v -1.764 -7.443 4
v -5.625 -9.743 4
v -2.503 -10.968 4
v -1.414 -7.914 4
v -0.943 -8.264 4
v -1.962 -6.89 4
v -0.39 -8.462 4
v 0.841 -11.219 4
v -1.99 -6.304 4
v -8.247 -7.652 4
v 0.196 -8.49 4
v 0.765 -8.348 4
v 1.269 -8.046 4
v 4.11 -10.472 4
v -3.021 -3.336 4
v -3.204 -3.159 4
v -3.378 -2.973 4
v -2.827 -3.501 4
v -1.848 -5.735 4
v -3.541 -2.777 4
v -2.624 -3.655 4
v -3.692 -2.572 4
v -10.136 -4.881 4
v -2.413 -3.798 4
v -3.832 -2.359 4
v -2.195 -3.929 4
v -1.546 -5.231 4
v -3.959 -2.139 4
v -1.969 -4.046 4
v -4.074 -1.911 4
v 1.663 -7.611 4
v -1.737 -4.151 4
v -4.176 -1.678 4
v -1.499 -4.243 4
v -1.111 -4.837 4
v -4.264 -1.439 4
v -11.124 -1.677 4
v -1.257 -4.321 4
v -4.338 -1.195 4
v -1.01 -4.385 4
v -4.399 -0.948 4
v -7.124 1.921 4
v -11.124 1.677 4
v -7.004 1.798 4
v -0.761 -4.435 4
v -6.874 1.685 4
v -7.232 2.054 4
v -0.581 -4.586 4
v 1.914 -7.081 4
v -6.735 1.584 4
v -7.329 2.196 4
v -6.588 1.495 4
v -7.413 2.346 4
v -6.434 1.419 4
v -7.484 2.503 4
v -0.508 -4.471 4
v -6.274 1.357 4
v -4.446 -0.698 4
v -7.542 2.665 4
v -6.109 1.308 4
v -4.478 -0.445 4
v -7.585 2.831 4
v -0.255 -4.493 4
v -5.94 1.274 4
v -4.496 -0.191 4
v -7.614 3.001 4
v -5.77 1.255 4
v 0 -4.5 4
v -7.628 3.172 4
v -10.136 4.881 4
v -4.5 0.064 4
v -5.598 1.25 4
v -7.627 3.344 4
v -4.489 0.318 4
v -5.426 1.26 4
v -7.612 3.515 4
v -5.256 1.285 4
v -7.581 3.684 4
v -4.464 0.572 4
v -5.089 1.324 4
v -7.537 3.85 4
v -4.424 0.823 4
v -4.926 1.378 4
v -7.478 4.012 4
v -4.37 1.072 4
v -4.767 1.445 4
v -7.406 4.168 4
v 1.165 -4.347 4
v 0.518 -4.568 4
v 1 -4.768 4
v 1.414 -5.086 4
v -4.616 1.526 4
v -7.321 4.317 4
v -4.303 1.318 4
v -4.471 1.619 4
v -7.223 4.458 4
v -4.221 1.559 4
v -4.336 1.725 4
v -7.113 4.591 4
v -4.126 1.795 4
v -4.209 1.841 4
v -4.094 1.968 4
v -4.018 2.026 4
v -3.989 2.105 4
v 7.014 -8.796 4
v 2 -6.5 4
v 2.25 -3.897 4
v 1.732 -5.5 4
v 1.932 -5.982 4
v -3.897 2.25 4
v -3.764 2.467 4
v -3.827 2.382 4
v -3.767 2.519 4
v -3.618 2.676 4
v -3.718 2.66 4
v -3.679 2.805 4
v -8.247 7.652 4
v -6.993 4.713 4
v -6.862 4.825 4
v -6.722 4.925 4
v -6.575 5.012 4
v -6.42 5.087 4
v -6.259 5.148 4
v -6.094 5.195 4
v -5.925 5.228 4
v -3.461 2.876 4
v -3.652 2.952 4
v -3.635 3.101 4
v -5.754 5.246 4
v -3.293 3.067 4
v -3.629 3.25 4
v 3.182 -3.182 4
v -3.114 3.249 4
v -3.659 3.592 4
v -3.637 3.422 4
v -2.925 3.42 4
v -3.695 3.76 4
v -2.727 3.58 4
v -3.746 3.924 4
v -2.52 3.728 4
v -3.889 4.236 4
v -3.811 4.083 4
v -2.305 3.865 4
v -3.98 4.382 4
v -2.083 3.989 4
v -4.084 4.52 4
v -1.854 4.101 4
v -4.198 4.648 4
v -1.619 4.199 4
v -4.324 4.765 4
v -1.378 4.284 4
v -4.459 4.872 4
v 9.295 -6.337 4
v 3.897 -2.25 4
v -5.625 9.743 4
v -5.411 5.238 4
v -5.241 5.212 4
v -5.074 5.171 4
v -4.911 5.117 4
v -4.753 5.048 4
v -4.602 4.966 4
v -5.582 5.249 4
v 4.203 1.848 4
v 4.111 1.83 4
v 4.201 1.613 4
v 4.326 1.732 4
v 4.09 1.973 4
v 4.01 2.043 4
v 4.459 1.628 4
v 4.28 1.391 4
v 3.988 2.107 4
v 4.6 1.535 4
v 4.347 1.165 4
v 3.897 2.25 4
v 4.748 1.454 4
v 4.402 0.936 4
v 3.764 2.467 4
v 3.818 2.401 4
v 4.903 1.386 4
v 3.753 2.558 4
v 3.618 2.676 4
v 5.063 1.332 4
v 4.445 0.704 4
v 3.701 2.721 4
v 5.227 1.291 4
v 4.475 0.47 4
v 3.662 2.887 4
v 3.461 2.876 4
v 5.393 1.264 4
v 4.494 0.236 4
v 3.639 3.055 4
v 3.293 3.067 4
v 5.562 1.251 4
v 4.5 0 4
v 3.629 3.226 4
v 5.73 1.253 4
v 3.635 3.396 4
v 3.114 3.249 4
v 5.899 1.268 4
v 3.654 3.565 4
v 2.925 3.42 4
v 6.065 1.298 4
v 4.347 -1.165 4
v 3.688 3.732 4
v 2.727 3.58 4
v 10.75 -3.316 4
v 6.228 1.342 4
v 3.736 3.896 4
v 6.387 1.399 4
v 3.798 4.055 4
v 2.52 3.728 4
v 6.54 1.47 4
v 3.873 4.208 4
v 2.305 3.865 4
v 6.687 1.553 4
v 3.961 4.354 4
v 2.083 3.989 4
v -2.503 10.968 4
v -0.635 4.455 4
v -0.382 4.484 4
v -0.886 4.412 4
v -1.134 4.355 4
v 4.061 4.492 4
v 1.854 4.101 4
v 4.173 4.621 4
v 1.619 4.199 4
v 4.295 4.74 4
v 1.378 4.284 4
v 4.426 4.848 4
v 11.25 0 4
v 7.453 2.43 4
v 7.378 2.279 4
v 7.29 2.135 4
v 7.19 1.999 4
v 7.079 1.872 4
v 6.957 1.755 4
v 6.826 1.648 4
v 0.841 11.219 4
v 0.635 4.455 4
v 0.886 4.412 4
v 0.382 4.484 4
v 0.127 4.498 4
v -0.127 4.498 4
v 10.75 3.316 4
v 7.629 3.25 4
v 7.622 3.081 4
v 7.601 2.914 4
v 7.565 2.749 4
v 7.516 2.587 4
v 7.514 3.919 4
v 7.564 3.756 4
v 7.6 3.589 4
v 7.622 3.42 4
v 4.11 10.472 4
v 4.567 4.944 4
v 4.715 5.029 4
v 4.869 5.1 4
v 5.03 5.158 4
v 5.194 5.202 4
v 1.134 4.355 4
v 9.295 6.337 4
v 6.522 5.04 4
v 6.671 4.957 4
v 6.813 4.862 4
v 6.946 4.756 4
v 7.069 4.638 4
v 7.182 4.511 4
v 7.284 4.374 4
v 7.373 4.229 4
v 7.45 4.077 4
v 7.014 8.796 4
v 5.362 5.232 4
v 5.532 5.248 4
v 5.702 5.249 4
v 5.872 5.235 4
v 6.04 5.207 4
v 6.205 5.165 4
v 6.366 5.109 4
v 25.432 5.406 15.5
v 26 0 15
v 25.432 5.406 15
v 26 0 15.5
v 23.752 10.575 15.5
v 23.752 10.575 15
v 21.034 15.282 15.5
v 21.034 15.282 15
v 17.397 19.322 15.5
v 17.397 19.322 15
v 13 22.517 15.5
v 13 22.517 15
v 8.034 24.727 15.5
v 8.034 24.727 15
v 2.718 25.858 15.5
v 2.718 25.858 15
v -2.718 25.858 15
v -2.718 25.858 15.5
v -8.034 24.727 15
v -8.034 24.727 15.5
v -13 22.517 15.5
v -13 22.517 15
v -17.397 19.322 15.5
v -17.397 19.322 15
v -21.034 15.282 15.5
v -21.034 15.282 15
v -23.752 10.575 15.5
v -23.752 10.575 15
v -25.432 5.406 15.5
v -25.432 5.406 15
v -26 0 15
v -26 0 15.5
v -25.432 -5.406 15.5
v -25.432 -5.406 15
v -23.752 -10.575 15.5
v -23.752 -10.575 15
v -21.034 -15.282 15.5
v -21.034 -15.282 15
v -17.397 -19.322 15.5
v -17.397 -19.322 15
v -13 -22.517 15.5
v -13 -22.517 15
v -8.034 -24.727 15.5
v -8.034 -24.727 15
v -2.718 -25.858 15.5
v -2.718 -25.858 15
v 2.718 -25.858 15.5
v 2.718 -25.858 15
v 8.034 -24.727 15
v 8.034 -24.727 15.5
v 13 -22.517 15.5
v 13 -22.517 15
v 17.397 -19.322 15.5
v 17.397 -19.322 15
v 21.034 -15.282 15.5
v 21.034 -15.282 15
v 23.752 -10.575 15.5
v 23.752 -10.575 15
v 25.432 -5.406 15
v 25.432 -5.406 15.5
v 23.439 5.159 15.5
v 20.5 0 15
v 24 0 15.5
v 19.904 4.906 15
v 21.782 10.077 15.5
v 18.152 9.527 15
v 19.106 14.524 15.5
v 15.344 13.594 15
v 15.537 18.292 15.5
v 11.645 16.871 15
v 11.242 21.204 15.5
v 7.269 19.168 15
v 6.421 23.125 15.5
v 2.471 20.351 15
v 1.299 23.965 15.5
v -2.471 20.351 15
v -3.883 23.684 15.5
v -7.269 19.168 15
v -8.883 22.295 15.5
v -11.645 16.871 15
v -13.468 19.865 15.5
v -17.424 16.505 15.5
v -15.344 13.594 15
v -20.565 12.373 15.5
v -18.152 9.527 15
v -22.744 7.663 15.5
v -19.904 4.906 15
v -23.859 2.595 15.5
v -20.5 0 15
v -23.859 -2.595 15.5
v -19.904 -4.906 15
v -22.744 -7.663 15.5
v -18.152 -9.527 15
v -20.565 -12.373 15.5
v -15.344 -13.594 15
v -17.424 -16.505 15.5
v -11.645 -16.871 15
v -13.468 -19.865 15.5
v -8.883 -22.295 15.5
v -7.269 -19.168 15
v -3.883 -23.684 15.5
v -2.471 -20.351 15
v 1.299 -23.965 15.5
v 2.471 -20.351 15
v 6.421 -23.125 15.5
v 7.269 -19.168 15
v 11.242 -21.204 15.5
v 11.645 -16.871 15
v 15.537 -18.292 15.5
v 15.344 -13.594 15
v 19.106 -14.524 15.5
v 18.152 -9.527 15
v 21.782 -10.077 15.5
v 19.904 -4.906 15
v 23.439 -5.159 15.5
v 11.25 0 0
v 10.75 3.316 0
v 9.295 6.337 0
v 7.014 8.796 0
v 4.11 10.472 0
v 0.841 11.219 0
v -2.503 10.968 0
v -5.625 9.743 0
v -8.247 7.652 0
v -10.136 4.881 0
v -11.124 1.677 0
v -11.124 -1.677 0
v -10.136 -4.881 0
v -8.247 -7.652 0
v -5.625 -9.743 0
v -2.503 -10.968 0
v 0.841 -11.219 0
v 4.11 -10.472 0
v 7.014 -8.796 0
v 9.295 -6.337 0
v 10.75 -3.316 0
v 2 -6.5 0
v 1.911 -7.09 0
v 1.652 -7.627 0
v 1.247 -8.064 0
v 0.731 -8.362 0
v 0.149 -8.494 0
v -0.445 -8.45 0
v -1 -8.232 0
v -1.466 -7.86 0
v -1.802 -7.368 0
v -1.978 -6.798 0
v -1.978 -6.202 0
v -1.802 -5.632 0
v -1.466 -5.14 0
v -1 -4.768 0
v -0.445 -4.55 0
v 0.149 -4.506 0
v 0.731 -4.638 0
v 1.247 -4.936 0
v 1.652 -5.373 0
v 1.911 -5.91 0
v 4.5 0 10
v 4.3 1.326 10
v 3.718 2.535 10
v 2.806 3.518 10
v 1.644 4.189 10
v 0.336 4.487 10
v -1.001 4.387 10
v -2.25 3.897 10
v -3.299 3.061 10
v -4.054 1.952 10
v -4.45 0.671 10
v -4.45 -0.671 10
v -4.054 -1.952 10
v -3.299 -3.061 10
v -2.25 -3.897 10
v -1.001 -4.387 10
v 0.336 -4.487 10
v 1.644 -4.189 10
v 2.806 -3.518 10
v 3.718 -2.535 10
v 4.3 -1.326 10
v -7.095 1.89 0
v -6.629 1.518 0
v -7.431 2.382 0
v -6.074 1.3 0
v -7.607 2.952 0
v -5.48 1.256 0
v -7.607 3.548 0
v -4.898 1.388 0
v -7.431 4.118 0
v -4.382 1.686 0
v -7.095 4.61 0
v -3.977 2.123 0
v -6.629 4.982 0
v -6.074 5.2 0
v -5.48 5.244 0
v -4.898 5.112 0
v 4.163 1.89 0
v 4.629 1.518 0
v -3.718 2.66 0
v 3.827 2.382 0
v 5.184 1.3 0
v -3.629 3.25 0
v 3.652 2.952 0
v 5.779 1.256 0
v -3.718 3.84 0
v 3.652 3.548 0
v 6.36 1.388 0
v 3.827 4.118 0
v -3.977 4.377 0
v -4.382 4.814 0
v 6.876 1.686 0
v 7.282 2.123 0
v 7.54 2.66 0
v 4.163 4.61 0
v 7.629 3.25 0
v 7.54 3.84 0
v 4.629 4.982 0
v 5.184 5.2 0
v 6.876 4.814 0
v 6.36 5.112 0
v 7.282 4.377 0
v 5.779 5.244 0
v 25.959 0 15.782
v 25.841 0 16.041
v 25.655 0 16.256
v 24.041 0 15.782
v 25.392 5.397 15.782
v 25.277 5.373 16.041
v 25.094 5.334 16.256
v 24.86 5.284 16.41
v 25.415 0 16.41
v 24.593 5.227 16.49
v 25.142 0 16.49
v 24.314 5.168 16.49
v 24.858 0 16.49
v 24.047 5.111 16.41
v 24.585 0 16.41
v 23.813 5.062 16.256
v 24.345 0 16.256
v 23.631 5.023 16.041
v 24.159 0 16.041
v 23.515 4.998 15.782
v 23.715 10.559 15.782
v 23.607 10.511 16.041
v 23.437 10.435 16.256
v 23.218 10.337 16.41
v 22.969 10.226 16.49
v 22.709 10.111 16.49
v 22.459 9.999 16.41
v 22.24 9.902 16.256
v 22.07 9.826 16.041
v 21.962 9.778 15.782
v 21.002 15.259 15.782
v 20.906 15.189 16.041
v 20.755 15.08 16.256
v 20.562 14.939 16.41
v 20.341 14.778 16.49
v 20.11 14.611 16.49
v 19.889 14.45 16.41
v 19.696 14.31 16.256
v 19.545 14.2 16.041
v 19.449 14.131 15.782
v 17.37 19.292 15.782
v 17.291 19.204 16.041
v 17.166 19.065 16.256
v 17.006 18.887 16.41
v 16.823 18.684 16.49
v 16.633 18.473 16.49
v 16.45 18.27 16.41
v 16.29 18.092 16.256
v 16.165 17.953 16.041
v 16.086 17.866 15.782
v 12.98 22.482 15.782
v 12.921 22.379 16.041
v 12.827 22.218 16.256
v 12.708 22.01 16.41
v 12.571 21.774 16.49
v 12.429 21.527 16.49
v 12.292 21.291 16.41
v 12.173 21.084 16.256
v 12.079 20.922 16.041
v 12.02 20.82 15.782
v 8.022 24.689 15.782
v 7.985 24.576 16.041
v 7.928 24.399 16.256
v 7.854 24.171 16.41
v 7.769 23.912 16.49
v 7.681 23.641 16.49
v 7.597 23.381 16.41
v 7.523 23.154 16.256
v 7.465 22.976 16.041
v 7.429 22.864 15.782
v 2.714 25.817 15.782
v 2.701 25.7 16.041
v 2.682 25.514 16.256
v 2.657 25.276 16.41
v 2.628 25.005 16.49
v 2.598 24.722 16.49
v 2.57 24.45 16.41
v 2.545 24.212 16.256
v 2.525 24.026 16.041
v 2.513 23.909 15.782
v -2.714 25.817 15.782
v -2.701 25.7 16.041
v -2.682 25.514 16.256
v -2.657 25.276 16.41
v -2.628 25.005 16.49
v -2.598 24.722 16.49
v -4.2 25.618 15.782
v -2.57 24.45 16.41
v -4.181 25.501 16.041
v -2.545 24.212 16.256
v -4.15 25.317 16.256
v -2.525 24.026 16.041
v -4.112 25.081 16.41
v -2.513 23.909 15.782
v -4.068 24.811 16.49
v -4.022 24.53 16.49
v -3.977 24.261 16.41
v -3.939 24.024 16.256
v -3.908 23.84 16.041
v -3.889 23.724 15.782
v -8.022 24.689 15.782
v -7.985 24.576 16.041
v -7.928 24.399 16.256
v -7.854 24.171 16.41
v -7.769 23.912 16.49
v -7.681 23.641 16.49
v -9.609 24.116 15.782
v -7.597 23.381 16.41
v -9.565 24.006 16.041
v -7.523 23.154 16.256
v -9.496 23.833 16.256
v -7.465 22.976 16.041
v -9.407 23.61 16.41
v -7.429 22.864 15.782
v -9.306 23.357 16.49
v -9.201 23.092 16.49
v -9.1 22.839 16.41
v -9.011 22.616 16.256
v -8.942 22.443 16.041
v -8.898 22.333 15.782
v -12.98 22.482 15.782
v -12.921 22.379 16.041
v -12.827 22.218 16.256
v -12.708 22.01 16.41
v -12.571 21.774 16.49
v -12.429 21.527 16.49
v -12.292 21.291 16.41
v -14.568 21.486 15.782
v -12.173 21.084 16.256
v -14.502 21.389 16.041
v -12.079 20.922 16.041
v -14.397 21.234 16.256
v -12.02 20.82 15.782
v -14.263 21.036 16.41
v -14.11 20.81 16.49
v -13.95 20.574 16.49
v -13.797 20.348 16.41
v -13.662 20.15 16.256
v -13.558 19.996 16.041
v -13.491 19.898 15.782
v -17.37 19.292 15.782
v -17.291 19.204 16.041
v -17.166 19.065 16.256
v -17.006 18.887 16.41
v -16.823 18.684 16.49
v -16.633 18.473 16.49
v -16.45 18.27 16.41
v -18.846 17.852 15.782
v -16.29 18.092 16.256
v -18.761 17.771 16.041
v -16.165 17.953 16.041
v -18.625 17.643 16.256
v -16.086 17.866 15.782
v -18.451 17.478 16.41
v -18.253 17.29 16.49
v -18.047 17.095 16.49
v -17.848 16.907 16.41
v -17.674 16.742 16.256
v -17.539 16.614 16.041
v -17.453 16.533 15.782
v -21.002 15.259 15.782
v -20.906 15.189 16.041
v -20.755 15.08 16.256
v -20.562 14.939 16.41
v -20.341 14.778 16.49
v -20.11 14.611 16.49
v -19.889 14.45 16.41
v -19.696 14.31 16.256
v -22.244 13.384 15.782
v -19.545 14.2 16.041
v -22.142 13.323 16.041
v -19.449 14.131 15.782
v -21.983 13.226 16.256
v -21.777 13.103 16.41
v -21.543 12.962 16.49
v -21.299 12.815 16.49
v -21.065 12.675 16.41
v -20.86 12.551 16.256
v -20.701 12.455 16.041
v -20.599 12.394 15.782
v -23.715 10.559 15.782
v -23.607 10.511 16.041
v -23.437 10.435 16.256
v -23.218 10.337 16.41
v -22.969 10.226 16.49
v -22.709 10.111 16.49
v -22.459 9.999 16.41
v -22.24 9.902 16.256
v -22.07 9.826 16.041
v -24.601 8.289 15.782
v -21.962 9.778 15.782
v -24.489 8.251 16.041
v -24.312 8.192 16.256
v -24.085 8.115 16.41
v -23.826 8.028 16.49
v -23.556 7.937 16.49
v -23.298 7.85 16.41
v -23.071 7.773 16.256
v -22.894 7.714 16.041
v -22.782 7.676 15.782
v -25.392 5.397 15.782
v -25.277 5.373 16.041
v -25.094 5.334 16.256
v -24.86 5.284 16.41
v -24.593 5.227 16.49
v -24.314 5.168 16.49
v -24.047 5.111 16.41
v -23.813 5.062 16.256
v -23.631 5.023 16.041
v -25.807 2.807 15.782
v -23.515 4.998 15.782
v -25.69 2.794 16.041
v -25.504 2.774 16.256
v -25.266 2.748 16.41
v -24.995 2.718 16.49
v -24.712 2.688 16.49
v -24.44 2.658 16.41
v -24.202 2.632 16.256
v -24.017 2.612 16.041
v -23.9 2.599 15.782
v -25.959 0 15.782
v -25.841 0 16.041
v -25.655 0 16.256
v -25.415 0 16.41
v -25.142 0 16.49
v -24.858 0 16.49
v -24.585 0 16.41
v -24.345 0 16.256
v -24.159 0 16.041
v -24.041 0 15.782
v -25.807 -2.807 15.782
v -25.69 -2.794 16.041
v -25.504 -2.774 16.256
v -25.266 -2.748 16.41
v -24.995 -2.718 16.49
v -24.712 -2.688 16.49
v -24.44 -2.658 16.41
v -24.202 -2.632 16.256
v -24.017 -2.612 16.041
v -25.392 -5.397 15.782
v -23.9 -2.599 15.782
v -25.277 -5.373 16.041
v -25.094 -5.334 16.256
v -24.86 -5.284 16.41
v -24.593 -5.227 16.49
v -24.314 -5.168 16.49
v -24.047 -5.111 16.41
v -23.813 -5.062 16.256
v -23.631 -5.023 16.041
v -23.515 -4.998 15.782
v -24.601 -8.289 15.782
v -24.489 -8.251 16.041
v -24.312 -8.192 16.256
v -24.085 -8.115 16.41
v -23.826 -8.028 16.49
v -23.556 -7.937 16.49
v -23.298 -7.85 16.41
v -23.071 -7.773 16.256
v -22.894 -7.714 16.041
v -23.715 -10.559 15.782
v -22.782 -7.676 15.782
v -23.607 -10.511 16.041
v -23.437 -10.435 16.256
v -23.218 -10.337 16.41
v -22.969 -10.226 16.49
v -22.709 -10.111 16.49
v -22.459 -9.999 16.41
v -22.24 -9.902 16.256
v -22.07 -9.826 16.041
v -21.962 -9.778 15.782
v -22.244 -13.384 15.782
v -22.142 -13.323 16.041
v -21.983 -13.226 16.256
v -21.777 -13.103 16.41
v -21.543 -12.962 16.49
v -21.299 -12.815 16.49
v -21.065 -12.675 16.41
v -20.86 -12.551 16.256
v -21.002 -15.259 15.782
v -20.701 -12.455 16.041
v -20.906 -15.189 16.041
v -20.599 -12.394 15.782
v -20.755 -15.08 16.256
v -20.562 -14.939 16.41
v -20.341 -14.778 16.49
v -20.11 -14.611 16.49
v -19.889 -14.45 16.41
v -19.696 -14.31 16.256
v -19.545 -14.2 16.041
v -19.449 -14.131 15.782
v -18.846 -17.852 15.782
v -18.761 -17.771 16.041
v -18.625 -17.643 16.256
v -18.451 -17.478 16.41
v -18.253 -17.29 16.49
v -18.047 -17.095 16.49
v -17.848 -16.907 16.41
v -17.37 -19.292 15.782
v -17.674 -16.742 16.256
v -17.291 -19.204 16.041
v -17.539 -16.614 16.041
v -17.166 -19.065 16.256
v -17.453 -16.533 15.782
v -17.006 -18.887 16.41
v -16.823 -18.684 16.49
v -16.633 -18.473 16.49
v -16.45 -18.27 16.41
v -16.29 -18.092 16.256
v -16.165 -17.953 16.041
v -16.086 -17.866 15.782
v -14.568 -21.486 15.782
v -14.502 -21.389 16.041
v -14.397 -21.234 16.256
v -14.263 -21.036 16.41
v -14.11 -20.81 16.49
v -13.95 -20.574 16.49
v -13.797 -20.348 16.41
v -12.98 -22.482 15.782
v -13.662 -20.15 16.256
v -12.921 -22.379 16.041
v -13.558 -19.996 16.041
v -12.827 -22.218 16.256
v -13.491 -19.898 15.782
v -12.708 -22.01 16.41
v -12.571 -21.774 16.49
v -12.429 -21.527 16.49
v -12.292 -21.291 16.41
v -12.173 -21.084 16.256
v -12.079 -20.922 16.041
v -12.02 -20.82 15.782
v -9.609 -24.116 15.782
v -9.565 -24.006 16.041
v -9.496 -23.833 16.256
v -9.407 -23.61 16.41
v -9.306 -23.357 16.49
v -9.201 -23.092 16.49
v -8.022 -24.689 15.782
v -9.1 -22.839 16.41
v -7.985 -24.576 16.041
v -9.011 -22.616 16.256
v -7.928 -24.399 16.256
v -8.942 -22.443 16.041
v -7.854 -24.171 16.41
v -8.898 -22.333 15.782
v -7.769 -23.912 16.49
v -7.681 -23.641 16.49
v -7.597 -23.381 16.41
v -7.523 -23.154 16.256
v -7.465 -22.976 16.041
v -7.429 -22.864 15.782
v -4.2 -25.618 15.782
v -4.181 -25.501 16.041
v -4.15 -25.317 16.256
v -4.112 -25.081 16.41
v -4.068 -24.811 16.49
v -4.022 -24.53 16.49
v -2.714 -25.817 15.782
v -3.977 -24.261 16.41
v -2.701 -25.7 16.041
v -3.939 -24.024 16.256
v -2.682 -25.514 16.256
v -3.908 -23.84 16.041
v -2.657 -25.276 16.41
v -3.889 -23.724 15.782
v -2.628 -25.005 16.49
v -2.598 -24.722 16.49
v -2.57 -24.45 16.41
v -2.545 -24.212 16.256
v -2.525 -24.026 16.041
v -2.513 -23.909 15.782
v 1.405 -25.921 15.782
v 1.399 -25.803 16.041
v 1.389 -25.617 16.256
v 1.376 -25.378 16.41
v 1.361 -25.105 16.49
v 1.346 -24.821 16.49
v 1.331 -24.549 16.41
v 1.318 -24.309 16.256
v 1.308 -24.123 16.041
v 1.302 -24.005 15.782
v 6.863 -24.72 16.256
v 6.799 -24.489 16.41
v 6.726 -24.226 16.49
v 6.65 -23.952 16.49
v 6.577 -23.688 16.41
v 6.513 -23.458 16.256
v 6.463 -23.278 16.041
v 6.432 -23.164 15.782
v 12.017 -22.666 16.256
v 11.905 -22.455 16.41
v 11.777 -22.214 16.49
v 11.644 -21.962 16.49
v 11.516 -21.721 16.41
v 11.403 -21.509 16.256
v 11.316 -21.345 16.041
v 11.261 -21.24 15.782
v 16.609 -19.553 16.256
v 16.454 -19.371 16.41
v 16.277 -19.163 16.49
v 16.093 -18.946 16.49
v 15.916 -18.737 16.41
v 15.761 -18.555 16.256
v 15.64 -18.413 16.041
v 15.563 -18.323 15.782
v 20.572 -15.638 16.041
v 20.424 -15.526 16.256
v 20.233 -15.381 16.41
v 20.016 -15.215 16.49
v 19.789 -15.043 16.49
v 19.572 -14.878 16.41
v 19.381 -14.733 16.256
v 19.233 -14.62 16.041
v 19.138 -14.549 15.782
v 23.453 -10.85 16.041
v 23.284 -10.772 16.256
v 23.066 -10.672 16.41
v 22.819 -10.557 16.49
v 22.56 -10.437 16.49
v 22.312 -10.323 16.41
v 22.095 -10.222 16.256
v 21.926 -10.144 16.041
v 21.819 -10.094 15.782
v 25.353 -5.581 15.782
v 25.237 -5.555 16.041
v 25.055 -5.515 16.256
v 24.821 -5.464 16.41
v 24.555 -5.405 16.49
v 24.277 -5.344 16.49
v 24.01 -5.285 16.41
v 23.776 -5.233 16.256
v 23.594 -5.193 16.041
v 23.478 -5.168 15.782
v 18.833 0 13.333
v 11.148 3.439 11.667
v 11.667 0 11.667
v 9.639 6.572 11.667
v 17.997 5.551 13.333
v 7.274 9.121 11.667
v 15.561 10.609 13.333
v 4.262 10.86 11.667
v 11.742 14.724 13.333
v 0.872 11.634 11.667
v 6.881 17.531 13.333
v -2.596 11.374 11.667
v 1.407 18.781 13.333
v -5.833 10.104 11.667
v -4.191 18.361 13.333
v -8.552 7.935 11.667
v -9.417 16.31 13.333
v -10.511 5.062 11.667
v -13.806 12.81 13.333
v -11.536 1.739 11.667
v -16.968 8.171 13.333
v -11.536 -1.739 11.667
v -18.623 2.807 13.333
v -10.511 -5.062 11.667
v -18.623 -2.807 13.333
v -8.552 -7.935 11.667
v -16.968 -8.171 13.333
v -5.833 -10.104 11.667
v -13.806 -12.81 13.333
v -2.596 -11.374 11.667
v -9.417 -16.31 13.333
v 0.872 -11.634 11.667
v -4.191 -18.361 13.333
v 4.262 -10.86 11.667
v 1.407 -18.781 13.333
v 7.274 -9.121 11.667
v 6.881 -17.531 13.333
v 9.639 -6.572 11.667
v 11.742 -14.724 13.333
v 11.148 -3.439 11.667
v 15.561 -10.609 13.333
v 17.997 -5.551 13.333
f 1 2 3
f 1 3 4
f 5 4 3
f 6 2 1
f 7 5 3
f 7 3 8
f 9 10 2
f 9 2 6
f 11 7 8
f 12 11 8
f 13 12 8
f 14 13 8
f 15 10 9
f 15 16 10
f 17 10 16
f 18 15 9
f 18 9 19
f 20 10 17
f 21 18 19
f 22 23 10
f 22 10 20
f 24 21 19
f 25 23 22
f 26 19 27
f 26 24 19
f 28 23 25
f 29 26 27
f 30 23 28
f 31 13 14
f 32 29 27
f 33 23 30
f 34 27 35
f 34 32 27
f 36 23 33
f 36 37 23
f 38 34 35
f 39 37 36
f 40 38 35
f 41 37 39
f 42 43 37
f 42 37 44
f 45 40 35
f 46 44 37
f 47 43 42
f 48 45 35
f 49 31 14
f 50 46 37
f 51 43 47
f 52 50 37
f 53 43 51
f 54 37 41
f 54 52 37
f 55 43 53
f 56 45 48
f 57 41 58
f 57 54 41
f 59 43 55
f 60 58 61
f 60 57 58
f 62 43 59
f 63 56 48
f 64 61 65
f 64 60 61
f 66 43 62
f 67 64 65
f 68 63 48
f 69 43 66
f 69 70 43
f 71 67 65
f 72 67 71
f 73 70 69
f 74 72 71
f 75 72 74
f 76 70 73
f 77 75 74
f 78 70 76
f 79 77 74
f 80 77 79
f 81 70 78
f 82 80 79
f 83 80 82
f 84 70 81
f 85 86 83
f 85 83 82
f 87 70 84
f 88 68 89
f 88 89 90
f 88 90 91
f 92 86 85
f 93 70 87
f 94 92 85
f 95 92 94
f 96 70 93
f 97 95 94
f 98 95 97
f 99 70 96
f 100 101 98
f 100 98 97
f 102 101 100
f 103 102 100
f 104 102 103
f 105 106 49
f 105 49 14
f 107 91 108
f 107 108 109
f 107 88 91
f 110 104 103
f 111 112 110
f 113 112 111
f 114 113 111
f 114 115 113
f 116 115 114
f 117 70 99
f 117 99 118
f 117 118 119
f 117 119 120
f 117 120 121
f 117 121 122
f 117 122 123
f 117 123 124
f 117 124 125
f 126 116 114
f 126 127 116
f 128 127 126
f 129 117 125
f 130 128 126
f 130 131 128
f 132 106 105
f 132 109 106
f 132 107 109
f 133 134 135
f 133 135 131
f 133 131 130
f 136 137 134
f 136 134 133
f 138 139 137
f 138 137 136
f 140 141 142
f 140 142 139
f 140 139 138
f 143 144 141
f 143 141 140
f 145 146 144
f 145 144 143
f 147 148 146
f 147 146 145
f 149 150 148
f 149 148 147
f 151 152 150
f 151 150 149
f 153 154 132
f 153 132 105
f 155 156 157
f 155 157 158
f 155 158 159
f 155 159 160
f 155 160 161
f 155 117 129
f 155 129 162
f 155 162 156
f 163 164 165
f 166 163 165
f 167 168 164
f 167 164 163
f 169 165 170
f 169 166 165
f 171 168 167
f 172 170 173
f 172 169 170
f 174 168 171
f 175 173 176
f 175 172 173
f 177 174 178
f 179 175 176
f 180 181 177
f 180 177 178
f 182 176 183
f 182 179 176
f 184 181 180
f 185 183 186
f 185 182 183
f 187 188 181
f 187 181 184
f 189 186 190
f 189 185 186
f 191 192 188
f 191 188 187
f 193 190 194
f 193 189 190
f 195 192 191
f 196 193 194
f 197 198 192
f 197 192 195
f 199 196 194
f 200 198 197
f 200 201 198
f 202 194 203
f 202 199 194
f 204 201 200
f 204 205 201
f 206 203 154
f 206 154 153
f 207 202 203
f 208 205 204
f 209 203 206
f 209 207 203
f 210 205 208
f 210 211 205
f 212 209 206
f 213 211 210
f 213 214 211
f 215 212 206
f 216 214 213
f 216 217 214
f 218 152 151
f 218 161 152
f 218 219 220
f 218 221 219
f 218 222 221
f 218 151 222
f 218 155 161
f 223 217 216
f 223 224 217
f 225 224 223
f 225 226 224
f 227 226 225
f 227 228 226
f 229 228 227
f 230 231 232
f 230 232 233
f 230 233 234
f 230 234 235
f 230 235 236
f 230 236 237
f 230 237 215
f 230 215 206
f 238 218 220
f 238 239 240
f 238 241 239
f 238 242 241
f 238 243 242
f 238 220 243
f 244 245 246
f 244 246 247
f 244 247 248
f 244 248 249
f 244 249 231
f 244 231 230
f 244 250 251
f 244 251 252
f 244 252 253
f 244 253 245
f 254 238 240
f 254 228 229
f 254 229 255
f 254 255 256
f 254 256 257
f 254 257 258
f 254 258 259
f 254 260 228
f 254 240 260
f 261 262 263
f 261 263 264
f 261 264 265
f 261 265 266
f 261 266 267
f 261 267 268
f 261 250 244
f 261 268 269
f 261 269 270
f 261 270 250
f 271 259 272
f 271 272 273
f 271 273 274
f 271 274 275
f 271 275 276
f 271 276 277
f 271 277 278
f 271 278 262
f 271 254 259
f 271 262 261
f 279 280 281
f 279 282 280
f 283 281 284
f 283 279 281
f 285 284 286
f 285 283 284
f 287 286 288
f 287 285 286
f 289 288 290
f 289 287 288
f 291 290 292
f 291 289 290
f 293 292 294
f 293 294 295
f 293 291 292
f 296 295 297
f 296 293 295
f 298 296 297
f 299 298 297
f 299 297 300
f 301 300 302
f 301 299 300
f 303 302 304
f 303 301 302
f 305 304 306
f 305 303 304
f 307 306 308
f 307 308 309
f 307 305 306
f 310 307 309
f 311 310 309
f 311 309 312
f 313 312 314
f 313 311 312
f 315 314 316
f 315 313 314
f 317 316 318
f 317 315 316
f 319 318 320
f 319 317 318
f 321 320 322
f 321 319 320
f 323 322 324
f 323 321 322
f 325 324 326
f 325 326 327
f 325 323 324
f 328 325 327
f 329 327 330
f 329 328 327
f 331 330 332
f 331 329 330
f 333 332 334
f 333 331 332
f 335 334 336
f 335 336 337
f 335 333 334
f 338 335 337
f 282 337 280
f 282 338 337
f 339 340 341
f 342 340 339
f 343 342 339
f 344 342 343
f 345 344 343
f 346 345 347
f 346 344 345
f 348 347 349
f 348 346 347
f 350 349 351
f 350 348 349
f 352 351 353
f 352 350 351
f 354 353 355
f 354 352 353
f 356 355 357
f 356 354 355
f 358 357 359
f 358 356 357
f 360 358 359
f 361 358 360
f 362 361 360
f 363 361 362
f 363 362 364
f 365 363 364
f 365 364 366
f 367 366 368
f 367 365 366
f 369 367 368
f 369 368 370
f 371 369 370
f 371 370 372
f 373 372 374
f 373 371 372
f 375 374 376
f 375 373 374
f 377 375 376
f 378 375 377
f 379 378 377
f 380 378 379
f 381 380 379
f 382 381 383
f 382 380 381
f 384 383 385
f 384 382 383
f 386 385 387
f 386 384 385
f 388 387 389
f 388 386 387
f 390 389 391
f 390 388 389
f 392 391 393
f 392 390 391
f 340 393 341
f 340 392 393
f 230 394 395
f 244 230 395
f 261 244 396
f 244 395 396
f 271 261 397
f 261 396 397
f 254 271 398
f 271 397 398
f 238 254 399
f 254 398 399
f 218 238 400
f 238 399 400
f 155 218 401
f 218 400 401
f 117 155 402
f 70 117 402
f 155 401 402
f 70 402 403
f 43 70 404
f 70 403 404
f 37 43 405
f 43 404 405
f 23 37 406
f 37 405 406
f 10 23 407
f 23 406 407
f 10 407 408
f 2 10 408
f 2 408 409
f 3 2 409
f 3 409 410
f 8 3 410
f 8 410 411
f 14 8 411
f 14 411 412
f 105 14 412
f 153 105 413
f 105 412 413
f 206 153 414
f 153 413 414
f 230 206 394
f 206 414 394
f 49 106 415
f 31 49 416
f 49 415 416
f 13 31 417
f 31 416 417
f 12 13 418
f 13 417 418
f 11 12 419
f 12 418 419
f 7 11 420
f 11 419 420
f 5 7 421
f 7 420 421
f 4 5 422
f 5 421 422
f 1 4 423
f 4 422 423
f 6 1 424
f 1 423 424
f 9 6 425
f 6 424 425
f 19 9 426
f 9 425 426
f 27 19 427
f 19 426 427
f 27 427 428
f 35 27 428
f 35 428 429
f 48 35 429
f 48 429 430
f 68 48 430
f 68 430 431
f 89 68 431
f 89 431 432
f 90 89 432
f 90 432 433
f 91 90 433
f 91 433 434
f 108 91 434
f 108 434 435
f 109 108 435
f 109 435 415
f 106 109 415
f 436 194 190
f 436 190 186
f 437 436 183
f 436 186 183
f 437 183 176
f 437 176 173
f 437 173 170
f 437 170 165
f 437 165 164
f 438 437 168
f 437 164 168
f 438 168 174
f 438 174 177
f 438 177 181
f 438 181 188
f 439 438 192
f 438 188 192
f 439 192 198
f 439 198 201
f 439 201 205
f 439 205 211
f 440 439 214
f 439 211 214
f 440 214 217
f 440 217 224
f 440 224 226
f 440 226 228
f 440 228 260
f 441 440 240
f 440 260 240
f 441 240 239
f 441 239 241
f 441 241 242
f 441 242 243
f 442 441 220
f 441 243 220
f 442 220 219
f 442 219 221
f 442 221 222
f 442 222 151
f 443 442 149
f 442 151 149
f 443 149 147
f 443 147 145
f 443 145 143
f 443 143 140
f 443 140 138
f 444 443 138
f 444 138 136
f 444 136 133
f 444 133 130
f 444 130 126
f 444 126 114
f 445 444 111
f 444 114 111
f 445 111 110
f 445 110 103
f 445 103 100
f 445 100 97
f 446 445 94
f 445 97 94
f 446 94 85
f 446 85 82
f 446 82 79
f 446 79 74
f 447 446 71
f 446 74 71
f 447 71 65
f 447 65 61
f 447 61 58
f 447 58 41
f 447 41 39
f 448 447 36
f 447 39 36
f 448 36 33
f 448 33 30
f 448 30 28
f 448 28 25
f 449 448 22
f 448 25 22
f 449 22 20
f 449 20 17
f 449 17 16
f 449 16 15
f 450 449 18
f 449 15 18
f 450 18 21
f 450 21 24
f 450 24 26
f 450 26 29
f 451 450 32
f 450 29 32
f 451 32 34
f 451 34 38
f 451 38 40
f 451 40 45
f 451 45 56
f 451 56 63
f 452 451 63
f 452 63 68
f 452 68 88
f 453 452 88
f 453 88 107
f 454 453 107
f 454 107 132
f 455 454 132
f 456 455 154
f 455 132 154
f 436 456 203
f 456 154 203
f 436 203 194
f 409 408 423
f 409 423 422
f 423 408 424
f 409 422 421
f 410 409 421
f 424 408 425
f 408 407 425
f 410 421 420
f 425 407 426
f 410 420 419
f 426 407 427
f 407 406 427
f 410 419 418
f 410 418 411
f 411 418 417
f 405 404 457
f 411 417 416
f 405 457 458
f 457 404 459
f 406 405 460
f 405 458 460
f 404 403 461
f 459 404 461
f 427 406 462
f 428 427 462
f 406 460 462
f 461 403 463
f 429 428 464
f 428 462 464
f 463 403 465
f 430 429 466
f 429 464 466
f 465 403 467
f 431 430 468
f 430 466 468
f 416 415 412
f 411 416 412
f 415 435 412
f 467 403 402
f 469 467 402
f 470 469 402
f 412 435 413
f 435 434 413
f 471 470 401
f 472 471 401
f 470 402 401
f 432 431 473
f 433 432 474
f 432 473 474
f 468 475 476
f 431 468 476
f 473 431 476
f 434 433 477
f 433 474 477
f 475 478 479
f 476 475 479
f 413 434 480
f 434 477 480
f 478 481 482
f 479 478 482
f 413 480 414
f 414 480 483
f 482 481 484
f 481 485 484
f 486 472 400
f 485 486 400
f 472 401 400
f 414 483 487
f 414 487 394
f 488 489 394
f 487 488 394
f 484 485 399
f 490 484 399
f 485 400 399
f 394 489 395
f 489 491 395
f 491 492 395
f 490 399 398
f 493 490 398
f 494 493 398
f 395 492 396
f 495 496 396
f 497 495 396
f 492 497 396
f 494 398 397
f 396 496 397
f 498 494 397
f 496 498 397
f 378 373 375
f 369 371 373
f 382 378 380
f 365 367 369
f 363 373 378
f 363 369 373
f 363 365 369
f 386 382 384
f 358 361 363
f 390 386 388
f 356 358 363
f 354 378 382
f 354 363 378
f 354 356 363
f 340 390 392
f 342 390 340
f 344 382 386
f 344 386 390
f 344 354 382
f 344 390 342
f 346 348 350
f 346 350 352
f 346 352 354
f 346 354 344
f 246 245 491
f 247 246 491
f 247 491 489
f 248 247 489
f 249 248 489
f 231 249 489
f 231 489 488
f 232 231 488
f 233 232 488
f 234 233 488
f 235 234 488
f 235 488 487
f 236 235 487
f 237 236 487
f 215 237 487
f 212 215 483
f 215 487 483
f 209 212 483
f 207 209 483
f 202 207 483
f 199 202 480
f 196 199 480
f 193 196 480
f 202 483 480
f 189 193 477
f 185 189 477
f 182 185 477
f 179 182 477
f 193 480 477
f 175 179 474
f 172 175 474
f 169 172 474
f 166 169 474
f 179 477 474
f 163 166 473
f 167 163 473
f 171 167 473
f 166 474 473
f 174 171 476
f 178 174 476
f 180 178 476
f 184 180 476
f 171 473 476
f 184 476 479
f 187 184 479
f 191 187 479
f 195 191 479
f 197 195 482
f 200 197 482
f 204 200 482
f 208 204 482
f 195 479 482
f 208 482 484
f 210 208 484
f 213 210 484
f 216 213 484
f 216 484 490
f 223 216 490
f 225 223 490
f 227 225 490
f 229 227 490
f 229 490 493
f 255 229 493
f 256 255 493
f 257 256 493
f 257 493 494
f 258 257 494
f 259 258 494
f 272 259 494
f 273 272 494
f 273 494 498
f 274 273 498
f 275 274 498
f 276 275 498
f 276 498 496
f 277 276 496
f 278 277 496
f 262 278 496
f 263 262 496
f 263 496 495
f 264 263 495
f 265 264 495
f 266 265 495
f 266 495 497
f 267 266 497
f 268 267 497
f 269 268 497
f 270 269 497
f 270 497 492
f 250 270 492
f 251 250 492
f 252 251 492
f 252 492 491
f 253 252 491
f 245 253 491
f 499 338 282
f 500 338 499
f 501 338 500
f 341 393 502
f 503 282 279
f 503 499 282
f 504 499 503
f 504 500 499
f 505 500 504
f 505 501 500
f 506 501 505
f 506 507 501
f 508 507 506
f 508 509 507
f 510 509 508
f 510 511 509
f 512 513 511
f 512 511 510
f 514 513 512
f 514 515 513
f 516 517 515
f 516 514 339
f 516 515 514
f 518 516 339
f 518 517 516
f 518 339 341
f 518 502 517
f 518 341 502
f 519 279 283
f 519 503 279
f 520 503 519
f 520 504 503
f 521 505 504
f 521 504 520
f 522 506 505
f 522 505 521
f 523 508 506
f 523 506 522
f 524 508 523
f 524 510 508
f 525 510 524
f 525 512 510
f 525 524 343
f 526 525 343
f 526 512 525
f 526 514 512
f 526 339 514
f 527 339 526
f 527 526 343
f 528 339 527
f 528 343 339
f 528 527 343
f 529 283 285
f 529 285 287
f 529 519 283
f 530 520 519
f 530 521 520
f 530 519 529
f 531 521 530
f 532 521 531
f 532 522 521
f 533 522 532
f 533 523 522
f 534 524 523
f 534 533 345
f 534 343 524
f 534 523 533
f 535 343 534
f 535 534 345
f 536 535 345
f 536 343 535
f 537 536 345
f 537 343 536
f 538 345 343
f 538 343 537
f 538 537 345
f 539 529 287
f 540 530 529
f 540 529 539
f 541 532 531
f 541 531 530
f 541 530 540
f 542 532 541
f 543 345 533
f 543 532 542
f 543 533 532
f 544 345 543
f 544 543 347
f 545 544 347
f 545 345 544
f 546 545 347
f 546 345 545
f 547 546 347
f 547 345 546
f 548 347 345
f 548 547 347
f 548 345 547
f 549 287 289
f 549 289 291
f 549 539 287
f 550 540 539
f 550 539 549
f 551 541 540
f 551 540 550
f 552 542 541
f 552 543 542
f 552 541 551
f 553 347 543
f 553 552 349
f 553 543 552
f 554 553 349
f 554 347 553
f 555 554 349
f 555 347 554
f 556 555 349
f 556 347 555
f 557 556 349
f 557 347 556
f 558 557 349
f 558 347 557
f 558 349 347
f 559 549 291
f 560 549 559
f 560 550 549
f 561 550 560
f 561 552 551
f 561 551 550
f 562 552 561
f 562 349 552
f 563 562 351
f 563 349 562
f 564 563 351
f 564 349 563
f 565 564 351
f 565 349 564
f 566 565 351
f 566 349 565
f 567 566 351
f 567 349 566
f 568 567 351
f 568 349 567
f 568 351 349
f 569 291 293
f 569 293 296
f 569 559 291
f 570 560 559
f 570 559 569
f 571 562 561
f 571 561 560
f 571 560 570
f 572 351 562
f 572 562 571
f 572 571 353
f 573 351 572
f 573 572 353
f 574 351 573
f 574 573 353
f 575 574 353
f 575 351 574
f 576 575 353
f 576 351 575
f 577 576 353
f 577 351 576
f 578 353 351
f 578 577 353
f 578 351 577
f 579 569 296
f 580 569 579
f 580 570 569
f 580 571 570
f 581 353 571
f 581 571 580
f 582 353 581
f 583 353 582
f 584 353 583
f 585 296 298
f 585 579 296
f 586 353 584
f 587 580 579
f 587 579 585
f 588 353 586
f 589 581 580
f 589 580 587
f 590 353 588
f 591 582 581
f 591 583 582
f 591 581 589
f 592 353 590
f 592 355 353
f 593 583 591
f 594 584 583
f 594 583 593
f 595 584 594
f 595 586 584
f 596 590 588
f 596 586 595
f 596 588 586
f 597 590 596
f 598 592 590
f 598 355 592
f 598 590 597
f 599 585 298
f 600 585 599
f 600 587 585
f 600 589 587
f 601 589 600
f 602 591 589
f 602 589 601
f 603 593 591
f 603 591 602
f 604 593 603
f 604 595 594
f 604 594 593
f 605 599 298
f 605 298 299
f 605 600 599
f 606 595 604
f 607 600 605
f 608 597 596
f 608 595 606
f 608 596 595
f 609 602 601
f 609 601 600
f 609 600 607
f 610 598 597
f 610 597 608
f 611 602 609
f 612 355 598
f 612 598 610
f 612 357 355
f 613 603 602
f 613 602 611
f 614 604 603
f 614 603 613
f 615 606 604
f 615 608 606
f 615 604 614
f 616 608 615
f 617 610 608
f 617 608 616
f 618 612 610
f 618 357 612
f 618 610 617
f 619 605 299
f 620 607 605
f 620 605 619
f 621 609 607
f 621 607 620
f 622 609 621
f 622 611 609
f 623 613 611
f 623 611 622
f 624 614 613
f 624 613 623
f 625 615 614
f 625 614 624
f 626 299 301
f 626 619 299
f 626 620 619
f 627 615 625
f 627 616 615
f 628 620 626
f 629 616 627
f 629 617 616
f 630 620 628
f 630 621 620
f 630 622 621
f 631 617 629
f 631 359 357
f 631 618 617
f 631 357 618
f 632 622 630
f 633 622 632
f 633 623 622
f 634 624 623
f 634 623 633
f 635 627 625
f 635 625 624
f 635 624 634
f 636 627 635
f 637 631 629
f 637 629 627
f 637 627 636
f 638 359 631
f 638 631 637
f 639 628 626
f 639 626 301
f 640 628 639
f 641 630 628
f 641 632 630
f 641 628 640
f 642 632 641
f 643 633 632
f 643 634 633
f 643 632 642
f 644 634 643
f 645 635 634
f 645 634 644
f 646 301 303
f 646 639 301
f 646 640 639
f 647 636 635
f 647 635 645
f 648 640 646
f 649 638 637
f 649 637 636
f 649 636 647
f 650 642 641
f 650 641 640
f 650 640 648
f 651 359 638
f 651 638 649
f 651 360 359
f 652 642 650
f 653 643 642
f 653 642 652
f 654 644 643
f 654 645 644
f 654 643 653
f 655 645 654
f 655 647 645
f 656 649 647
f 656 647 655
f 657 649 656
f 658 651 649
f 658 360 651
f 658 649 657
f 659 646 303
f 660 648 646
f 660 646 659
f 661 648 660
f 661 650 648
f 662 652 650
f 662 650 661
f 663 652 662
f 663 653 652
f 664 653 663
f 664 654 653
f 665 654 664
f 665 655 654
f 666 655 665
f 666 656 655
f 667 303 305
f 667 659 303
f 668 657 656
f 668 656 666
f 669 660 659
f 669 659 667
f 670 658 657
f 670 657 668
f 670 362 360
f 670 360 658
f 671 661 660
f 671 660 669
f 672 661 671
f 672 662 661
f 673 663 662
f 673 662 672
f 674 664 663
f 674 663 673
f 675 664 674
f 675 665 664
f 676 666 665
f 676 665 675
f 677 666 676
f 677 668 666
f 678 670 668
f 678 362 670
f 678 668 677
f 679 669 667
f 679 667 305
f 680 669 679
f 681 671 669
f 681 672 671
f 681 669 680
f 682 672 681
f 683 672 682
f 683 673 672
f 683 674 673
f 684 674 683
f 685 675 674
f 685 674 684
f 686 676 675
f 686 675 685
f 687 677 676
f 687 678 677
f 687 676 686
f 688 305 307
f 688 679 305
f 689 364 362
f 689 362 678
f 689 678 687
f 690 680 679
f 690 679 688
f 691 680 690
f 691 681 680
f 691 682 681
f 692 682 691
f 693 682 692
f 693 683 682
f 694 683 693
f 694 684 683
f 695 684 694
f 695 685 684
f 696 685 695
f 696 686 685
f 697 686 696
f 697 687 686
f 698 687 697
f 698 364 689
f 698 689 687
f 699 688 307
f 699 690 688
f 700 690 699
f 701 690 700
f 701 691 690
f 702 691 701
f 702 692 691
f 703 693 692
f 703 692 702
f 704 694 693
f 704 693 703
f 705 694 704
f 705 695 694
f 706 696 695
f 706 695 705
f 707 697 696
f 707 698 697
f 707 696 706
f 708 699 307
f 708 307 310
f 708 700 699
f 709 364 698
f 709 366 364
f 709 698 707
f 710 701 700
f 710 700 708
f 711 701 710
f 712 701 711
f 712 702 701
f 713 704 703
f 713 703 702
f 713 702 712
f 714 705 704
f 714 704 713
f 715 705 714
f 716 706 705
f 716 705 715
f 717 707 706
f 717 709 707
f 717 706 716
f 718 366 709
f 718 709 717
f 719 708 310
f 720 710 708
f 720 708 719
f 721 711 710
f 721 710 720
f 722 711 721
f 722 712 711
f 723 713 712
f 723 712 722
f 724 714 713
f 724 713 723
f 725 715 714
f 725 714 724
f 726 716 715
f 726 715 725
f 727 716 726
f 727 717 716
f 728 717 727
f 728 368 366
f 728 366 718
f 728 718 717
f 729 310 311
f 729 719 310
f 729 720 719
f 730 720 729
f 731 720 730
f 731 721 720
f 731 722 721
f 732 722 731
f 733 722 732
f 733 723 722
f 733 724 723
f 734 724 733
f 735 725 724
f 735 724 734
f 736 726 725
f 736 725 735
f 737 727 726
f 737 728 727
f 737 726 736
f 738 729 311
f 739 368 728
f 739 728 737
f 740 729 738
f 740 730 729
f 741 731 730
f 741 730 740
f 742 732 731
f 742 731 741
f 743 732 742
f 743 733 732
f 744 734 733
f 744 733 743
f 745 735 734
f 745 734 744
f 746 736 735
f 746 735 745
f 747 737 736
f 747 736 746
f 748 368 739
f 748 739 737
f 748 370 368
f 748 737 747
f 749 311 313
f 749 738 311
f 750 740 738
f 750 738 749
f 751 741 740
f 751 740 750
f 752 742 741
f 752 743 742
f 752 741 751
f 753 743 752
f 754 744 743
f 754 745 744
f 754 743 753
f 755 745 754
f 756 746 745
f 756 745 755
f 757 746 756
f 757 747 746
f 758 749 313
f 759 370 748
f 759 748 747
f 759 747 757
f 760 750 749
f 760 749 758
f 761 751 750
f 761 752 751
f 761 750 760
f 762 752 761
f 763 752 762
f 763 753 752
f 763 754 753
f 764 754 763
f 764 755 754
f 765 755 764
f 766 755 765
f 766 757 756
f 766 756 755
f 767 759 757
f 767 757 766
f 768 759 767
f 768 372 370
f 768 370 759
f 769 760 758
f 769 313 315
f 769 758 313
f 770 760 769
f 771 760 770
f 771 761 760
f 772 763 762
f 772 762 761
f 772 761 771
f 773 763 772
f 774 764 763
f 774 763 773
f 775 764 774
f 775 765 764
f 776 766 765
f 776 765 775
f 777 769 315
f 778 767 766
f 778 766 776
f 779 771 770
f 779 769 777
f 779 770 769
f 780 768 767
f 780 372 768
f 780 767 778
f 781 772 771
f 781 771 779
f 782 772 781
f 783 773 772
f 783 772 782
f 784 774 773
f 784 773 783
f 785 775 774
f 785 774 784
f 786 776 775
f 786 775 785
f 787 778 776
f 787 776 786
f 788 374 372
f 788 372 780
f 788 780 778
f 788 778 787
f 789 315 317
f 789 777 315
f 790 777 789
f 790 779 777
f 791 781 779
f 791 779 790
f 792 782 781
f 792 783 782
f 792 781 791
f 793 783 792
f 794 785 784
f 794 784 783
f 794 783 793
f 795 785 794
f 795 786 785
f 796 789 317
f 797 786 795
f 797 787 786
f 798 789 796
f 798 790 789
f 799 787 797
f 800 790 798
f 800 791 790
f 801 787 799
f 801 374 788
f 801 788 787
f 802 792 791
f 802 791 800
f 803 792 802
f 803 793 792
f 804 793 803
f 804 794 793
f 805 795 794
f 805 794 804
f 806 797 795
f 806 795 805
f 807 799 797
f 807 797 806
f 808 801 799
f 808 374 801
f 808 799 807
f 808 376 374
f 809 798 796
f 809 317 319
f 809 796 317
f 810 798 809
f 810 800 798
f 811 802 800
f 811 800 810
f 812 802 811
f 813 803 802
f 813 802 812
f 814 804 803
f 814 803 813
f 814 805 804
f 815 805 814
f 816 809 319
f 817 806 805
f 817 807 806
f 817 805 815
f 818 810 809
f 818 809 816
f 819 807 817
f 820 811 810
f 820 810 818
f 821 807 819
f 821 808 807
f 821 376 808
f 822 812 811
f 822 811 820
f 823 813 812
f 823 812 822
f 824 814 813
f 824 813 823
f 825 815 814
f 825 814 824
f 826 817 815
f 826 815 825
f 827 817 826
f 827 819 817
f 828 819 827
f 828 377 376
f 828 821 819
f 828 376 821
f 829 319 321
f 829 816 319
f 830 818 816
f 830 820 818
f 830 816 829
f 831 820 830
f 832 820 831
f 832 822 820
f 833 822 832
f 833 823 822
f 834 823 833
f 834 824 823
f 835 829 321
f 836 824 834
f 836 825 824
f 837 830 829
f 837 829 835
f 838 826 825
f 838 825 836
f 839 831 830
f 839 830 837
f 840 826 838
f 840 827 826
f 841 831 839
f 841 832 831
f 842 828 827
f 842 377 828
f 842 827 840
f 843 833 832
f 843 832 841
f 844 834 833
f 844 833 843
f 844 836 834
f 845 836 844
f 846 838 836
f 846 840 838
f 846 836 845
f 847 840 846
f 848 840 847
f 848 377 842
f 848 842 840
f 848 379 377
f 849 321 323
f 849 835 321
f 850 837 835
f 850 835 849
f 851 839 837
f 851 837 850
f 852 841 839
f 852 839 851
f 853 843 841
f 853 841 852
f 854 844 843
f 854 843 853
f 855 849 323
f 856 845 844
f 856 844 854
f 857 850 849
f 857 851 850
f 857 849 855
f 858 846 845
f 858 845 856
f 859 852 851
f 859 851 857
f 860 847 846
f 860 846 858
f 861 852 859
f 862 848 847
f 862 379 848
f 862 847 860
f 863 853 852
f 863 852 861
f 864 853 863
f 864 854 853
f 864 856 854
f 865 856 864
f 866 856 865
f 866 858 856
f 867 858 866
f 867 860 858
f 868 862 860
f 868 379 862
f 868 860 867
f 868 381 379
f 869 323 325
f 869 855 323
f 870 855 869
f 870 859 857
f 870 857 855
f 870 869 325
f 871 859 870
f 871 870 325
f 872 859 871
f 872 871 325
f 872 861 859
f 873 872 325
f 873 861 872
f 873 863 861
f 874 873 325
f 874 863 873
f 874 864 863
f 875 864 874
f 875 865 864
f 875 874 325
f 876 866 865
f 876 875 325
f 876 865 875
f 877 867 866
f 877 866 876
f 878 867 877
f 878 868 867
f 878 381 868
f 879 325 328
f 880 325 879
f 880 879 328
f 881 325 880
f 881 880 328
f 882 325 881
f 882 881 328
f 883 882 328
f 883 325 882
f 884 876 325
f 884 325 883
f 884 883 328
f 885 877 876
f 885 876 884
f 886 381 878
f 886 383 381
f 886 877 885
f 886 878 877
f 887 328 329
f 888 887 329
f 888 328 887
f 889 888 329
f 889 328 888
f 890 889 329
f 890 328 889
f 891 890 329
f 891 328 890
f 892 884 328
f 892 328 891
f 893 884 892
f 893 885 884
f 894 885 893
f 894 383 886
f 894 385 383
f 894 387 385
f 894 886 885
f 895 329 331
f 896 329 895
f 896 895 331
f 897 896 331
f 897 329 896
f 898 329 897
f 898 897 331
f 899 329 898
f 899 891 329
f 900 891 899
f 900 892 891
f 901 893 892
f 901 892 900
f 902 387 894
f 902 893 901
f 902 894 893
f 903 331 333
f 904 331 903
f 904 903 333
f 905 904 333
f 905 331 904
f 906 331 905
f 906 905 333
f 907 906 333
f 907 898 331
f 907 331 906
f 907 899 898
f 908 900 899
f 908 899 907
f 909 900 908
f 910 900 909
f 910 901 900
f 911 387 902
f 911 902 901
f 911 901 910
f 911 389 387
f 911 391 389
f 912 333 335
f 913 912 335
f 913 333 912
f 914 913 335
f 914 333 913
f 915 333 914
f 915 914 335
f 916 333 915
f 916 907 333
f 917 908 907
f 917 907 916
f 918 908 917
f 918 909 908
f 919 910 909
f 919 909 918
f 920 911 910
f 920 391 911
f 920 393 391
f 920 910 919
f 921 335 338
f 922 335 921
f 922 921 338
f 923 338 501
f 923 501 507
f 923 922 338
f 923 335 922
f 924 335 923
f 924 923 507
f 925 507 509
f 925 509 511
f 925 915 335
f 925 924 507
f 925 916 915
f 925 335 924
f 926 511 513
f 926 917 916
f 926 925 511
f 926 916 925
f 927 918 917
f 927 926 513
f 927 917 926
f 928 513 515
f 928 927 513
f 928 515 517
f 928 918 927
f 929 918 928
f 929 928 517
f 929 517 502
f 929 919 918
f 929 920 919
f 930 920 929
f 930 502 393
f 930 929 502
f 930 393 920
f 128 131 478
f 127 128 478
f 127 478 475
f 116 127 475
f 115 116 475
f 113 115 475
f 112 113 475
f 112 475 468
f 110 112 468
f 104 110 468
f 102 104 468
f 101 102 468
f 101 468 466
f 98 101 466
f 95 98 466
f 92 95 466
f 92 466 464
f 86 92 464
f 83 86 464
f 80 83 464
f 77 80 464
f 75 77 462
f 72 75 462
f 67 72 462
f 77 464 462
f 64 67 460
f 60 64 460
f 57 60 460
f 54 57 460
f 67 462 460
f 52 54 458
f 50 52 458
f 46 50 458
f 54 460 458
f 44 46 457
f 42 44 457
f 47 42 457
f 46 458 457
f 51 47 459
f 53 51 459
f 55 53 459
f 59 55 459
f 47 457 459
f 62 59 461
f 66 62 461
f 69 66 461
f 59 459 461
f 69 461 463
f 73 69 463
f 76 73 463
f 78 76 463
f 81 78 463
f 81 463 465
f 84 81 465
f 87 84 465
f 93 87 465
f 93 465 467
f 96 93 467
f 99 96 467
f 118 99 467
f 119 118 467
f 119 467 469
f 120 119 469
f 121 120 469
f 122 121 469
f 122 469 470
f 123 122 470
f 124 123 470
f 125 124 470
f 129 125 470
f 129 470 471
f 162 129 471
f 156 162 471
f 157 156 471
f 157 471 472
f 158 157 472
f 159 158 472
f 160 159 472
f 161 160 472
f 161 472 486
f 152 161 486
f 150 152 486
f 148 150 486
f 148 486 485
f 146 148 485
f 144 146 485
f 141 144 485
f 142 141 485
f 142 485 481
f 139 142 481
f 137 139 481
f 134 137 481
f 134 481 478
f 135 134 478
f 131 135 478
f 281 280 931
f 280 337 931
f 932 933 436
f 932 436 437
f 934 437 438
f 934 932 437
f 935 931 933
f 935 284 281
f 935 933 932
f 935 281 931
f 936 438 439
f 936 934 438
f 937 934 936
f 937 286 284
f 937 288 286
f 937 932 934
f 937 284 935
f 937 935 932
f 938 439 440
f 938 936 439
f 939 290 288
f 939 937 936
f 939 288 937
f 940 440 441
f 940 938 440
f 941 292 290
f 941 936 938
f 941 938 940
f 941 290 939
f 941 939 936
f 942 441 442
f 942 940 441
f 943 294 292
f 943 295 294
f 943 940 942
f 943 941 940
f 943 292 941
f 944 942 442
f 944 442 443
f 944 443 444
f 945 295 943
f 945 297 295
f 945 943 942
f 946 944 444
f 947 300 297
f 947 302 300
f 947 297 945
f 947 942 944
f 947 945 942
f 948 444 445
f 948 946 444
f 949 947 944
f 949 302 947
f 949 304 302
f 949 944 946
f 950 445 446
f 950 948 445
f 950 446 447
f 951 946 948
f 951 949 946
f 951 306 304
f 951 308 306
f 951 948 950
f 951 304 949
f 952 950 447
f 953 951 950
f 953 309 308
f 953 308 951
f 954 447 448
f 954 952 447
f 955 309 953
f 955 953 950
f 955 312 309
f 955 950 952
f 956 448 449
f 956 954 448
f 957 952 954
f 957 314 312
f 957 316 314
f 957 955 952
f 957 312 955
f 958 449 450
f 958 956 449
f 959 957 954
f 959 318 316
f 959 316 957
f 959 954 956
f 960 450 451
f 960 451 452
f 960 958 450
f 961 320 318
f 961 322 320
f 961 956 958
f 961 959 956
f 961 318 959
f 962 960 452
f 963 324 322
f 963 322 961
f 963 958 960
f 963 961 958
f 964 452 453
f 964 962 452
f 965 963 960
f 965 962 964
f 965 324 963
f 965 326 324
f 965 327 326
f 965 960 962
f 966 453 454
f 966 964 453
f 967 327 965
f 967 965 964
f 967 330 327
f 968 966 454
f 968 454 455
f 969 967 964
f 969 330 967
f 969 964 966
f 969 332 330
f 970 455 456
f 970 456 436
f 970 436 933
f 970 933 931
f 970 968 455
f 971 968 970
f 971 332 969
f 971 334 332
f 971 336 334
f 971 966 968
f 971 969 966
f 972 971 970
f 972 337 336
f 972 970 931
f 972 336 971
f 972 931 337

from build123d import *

# Parameters (mm, degrees)
F0_R     = 11.25
F1_DEPTH = 4
F2_R     = 4.5
F3_DEPTH = 6
F6_R     = 2
F7_DEPTH = 4


with BuildPart() as f1:
    # F0 (on Top) → F1 (new body)
    with BuildSketch(Plane.XY):
        Circle(F0_R)
    extrude(amount=F1_DEPTH)

    # F2 (on face) → F3 (join)
    with BuildSketch(Plane.XY.offset(4)):
        Circle(F2_R)
    extrude(amount=F3_DEPTH)

    # F4 (on Front) → F5 (revolve)
    with BuildSketch(Plane.XZ):
        with BuildLine():
            Line((20.5, 15), (0, 15))
            Line((0, 15), (0, 10))
            Line((0, 10), (4.5, 10))
            Line((4.5, 10), (26, 15))
            Line((26, 15), (26, 15.5))
            ThreePointArc((26, 15.5), (25, 16.5), (24, 15.5))
            Line((24, 15.5), (20.5, 15))
        make_face()
    revolve(axis=Axis((0, 0, 19.201497), (0, 0, 1)))

    # F6 (on face) → F7 (cut, through all)
    with BuildSketch(Plane(origin=(0, 0, 0), x_dir=(1, 0, 0), z_dir=(0, 0, -1))):
        with Locations((-5.629165, -3.25)):
            Circle(F6_R)
        with Locations((5.629165, -3.25)):
            Circle(F6_R)
        with Locations((0, 6.5)):
            Circle(F6_R)
    extrude(amount=-F7_DEPTH, mode=Mode.SUBTRACT)


solid = f1.part
